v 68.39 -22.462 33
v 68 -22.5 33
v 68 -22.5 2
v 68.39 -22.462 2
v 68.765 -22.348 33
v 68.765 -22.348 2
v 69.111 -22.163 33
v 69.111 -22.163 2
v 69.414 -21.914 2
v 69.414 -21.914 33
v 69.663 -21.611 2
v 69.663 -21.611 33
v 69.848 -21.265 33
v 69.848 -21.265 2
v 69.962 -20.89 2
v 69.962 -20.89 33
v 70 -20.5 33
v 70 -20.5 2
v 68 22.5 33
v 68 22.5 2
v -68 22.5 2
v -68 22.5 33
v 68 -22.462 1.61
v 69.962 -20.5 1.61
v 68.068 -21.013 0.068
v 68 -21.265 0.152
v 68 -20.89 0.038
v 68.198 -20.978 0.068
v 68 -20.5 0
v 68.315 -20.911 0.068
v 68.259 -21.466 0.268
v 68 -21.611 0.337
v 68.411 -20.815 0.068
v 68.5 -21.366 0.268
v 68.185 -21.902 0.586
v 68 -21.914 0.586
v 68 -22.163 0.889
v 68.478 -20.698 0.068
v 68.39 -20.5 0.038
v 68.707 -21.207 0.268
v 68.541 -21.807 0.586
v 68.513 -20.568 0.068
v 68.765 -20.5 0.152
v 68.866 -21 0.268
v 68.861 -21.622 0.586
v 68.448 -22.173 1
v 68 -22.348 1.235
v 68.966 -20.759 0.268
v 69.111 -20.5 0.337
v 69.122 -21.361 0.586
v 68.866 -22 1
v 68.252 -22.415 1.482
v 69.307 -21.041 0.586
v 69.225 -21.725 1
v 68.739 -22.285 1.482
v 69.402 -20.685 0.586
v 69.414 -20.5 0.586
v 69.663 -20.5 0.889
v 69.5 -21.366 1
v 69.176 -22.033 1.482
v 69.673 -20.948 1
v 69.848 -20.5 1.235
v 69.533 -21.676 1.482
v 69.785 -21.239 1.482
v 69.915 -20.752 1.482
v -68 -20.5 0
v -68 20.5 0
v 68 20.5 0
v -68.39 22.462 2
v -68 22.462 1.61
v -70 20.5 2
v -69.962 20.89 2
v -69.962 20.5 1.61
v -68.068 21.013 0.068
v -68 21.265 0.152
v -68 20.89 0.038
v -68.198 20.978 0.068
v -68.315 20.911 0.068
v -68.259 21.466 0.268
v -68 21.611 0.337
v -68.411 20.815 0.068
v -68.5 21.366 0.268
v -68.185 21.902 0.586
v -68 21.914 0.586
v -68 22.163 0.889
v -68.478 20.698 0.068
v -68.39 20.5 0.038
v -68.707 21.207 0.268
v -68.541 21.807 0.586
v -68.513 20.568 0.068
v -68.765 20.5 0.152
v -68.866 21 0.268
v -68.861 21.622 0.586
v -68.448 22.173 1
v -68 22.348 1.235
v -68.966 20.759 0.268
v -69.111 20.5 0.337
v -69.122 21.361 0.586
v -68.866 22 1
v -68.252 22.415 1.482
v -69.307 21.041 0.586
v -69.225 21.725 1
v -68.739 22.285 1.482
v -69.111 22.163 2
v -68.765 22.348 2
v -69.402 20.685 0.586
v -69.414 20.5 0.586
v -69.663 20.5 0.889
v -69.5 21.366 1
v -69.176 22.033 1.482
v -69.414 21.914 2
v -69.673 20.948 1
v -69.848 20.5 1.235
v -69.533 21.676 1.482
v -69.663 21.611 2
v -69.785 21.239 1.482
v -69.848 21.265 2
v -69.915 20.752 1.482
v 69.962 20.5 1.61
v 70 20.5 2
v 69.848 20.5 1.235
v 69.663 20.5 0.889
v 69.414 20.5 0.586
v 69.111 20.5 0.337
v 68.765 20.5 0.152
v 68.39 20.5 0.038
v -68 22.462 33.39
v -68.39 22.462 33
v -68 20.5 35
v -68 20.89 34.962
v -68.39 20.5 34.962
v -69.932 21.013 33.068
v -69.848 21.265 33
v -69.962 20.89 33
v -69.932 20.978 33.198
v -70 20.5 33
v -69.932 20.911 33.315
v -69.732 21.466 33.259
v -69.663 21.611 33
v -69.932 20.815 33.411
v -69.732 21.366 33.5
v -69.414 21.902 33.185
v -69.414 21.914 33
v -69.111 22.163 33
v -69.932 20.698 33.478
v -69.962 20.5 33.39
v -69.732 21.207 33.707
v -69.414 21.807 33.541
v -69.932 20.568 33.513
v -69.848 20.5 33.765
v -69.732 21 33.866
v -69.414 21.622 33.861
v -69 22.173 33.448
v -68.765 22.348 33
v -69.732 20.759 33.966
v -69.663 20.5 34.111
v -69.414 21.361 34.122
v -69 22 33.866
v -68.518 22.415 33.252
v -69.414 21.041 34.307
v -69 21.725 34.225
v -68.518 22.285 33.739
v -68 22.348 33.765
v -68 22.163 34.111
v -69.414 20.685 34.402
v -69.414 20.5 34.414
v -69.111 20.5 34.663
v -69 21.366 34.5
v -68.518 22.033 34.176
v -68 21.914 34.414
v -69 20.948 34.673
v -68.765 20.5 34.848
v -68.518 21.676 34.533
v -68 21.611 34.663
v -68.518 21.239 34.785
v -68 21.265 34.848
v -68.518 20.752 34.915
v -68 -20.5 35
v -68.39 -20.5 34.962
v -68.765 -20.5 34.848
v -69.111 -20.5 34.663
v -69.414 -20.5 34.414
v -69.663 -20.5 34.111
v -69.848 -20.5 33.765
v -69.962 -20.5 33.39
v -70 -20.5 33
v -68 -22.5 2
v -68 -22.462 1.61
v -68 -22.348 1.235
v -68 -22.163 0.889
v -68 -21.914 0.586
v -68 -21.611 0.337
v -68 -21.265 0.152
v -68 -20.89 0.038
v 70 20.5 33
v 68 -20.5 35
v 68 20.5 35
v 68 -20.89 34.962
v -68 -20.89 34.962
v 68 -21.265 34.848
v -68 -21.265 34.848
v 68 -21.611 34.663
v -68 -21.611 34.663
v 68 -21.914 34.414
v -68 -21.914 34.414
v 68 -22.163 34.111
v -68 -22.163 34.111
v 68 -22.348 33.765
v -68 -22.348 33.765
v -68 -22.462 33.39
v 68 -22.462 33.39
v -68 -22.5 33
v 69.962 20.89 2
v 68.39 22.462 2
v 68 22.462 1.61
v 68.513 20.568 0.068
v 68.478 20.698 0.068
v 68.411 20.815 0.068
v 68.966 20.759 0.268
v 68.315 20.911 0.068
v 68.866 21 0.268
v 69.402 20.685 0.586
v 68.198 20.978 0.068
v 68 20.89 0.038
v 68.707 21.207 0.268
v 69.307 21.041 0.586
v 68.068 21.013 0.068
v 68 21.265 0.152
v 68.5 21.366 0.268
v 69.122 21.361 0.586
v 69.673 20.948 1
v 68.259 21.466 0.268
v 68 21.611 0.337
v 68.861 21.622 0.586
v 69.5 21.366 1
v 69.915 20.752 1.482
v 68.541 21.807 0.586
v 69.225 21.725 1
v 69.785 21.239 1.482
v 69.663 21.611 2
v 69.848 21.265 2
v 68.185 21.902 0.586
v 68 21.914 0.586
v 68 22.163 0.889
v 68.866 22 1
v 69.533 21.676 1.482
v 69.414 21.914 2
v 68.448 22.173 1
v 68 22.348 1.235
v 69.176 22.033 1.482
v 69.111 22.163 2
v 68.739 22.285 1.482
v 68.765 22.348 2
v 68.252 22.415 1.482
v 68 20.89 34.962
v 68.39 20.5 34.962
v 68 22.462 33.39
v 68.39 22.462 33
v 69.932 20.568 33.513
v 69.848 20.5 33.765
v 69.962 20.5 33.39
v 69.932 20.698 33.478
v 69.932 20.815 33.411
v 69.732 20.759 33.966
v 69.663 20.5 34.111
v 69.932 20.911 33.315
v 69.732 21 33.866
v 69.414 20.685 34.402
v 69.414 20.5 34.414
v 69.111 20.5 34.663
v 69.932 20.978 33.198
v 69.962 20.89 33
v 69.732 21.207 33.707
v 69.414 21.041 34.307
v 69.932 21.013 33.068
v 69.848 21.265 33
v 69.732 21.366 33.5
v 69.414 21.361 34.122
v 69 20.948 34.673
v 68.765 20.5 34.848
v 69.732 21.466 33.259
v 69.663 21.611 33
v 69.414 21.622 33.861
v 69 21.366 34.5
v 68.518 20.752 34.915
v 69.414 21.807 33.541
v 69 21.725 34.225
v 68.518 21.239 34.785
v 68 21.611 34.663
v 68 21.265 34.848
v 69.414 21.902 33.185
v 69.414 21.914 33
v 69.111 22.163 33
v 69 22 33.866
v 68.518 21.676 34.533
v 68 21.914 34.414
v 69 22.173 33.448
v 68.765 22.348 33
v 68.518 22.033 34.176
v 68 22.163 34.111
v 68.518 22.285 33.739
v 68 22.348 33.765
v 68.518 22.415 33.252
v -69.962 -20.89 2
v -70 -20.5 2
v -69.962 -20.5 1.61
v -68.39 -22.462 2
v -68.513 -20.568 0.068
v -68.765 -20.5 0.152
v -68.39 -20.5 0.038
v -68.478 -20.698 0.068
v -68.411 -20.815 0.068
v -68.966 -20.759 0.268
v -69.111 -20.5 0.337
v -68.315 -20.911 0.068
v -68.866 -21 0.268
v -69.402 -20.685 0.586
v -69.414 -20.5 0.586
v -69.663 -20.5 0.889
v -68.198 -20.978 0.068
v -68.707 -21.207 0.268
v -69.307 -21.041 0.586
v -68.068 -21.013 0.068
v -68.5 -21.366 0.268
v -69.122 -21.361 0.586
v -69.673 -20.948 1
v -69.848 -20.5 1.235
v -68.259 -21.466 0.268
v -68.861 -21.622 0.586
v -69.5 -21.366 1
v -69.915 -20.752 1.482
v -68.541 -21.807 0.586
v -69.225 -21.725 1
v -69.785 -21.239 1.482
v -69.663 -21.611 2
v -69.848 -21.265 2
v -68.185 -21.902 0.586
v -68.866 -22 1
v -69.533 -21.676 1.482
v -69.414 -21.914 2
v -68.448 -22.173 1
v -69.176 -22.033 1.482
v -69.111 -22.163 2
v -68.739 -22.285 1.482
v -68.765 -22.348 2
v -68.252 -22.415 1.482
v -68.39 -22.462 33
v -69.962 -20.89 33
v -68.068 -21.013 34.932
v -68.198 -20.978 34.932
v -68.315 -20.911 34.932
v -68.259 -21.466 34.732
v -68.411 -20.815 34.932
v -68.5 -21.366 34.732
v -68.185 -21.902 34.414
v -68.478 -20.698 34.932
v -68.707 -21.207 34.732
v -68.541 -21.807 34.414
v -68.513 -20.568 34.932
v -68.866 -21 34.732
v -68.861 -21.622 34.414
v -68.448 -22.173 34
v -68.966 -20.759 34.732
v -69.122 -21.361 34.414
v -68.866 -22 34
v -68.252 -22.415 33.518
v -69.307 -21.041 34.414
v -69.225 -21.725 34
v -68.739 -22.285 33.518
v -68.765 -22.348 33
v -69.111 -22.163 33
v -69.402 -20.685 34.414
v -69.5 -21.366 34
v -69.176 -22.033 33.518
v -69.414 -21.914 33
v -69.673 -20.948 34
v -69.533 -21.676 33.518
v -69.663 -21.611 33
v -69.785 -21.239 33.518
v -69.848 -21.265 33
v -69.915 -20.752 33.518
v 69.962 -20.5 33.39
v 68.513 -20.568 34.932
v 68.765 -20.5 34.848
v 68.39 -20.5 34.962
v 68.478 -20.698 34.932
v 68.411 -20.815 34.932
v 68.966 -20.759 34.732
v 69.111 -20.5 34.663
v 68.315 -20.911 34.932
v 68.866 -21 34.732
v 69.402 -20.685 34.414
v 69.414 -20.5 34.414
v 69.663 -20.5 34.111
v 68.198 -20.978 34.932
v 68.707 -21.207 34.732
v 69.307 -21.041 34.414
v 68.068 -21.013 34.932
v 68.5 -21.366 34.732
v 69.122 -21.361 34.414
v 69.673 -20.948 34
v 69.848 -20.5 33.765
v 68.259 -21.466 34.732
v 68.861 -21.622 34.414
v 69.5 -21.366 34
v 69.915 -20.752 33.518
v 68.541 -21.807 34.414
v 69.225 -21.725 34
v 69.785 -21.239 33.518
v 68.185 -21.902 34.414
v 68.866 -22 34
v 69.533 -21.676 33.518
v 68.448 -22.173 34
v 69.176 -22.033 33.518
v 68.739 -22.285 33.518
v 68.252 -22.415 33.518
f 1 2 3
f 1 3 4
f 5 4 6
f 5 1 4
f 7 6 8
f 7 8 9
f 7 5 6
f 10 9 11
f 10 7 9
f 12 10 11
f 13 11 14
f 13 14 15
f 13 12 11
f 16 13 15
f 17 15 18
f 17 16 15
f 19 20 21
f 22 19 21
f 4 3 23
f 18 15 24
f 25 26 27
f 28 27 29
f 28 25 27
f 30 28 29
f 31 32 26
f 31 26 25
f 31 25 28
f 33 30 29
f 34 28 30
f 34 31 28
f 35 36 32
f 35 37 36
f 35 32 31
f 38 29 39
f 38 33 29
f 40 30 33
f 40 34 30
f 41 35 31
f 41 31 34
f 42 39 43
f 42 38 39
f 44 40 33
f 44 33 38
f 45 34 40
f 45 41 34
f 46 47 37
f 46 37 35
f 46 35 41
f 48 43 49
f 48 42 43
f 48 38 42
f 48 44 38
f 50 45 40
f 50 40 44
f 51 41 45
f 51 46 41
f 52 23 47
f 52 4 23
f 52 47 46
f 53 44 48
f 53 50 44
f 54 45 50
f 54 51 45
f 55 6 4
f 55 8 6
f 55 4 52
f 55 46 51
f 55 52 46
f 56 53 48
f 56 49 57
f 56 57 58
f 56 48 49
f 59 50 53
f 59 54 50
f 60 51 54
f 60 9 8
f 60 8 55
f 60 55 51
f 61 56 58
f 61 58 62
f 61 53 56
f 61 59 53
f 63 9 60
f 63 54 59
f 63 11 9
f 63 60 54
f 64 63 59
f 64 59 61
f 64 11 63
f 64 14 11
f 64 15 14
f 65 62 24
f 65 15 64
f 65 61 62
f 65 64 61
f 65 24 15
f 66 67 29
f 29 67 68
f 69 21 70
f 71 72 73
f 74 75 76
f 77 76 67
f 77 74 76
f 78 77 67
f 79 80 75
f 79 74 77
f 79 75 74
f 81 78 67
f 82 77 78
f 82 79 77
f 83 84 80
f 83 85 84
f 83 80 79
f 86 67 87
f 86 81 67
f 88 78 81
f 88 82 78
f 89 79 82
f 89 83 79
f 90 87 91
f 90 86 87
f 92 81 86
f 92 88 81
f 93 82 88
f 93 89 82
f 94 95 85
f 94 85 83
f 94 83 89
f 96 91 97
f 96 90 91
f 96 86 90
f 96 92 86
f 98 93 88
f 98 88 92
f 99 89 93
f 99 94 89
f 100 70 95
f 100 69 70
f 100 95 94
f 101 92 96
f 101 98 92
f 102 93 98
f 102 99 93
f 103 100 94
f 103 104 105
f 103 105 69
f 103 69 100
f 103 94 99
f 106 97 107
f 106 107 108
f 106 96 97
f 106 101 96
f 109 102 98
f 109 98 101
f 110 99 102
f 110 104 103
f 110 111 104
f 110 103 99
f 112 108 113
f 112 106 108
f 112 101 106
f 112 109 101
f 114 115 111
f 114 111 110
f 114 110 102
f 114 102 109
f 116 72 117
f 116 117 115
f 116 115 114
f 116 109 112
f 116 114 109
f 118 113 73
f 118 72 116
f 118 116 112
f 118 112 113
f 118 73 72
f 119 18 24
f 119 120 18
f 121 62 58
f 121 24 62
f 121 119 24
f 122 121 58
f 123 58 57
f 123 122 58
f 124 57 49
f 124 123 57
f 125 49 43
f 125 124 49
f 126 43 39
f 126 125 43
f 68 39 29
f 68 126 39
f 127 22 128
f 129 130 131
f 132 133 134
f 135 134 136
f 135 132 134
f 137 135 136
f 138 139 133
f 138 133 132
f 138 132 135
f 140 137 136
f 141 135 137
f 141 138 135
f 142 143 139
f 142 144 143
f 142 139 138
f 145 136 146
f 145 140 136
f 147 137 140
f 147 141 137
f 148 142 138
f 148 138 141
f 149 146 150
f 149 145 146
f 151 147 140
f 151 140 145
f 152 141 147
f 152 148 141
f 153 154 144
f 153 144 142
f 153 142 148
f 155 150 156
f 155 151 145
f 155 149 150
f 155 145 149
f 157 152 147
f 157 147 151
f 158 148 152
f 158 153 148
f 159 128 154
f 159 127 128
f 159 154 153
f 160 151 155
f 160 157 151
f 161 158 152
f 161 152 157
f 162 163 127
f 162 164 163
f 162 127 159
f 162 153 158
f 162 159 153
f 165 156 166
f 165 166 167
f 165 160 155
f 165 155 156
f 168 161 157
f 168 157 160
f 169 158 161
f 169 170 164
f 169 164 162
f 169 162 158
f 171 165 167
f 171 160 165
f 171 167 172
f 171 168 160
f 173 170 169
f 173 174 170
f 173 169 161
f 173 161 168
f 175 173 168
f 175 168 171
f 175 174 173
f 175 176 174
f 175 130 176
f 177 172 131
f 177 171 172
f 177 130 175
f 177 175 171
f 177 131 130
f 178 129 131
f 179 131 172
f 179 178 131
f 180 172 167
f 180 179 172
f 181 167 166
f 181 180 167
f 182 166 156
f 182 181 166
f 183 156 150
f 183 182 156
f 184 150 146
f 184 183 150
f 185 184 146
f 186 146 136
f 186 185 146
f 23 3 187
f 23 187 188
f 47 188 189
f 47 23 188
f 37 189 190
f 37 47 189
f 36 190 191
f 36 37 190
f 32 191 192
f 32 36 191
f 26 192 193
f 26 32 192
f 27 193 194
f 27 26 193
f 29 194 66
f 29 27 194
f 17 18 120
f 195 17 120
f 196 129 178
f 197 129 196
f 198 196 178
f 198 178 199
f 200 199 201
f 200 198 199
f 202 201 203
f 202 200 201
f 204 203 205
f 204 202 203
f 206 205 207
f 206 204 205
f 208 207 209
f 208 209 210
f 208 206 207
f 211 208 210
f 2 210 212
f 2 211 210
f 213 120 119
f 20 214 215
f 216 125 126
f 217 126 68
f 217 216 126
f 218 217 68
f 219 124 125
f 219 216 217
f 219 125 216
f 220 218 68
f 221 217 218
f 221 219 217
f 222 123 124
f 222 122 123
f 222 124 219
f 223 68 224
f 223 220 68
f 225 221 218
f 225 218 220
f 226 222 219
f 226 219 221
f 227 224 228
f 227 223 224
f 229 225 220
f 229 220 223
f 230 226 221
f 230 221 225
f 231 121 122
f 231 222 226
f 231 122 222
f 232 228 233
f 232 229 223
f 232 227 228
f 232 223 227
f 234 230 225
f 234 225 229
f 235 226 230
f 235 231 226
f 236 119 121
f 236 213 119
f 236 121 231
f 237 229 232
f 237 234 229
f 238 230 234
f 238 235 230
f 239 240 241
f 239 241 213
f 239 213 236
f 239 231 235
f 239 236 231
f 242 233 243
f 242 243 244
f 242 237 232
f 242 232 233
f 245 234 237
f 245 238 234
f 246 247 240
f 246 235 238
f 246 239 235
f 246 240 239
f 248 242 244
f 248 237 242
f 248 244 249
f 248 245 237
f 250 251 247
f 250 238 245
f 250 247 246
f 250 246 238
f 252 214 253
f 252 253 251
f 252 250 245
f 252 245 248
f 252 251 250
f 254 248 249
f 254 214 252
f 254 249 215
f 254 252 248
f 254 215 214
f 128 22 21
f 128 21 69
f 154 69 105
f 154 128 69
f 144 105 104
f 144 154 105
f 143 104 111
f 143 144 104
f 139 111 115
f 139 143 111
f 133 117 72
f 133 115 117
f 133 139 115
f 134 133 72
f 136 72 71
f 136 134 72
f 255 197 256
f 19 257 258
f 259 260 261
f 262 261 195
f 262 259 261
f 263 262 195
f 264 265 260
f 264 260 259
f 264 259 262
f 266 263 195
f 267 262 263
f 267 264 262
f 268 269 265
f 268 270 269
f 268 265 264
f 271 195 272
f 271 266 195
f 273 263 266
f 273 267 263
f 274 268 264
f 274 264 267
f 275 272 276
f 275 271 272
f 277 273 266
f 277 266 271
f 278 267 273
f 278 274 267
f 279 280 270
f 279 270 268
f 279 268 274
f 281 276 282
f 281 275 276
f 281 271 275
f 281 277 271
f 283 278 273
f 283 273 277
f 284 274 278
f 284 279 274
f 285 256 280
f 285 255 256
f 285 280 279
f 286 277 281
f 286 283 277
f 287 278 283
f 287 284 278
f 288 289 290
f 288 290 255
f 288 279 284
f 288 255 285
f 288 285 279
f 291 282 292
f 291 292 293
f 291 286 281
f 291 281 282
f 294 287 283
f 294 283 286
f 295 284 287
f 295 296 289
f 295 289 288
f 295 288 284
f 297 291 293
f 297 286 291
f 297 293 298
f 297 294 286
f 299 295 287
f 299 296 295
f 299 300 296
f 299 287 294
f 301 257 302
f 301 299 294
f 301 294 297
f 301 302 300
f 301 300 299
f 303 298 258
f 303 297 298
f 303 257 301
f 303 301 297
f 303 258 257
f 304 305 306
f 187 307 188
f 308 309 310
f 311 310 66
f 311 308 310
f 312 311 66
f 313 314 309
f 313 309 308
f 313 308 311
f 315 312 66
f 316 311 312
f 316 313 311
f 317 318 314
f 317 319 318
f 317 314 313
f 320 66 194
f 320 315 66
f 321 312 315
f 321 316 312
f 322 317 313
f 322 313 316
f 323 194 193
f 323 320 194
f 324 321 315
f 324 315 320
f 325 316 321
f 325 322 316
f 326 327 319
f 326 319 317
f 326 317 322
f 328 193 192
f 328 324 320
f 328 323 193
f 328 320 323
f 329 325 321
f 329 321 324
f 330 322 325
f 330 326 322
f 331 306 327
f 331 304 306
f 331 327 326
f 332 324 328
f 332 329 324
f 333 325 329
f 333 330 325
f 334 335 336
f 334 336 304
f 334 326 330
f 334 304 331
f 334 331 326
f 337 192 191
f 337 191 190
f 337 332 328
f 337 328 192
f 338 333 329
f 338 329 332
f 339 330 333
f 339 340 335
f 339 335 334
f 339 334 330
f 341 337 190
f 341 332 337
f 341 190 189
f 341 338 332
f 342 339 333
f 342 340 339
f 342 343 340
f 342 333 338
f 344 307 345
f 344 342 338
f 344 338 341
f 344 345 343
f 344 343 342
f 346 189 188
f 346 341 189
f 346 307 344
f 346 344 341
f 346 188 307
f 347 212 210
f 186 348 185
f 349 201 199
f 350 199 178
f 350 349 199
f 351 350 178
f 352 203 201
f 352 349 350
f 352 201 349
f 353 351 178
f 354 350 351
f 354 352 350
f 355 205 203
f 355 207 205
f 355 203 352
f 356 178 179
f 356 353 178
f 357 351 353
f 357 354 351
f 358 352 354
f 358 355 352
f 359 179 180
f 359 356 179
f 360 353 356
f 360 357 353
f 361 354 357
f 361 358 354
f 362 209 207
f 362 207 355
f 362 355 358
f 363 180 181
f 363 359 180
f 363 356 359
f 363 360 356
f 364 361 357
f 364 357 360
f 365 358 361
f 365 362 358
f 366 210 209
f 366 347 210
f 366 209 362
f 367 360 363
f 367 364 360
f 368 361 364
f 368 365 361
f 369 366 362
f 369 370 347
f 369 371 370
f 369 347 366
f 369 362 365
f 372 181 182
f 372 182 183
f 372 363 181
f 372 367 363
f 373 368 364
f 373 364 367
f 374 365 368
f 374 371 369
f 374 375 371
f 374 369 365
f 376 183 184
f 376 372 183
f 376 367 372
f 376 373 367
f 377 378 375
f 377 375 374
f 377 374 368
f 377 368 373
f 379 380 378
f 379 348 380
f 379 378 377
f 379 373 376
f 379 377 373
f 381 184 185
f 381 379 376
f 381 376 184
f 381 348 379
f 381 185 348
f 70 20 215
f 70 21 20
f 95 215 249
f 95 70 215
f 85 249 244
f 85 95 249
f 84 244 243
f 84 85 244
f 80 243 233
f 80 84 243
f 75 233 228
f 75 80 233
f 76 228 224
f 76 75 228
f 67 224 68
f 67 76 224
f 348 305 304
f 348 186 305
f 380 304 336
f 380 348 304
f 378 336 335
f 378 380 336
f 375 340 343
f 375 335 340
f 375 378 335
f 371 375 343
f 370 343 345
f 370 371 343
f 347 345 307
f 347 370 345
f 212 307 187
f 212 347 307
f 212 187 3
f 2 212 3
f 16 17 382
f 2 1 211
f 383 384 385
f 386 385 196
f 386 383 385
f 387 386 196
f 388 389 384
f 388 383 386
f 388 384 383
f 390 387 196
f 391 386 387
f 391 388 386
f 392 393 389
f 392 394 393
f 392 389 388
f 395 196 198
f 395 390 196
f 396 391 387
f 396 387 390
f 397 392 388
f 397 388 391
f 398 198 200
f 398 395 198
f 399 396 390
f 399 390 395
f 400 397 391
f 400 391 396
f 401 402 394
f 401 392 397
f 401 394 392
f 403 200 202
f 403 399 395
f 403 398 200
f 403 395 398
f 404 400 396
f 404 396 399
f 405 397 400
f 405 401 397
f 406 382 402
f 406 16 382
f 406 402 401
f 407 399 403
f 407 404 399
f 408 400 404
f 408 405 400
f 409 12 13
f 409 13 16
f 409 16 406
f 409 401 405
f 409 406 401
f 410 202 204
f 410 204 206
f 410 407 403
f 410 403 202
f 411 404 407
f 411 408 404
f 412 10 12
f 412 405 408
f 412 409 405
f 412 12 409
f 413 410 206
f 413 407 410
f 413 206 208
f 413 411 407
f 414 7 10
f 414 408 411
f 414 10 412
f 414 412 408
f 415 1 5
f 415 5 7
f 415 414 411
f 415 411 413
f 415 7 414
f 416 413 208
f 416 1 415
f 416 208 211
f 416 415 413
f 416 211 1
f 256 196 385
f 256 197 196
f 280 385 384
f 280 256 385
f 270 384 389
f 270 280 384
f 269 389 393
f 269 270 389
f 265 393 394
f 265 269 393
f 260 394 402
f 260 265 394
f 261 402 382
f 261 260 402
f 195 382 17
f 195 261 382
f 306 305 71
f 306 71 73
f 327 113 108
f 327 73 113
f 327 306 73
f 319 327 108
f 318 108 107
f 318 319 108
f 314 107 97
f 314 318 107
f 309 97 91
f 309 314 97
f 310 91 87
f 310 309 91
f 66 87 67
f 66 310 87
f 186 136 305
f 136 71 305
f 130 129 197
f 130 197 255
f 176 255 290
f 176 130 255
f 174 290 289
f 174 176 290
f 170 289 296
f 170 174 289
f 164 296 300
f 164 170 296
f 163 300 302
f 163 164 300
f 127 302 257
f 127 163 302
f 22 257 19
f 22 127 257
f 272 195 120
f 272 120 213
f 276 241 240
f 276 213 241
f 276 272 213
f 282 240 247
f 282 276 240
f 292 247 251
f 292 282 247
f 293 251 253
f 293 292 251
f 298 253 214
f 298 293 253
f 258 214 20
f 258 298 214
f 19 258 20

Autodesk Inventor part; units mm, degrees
ref_plane "YZ Plane" through (0, 0, 0) normal (1, 0, 0) x (0, 1, 0)
ref_plane "XZ Plane" through (0, 0, 0) normal (0, 1, 0) x (-1, 0, 0)
ref_plane "XY Plane" through (0, 0, 0) normal (0, 0, 1) x (1, 0, 0)
sketch "スケッチ1" plane through (0, 0, 0) normal (0, 0, 1) x (1, 0, 0)
  line L0 (-70, -22.5) -> (70, -22.5)
  line L1 (70, -22.5) -> (70, 22.5)
  line L2 (70, 22.5) -> (-70, 22.5)
  line L3 (-70, 22.5) -> (-70, -22.5)
  line L4 (-70, -22.5) -> (70, 22.5) construction
  line L5 (70, -22.5) -> (-70, 22.5) construction
  point P0 (0, 0)
  dimension "d0" = 140
  dimension "d1" = 45
extrude "押し出し1" add sketch "スケッチ1" along normal blind 35
fillet "フィレット1" radius 2 1 edges at (0, 22.5, 35)
fillet "フィレット1" radius 2 12 edges at (-70, -22.5, 17.5) (70, -22.5, 17.5) (0, -22.5, 0) (0, -22.5, 35) (-70, 22.5, 17.5) (-70, 0, 0) (-70, 0, 35) (70, 22.5, 17.5) (0, 22.5, 0) (0, 22.5, 35) (70, 0, 0) (70, 0, 35)
properties part number "Fullymax_6s" material "ABS プラスチック"
